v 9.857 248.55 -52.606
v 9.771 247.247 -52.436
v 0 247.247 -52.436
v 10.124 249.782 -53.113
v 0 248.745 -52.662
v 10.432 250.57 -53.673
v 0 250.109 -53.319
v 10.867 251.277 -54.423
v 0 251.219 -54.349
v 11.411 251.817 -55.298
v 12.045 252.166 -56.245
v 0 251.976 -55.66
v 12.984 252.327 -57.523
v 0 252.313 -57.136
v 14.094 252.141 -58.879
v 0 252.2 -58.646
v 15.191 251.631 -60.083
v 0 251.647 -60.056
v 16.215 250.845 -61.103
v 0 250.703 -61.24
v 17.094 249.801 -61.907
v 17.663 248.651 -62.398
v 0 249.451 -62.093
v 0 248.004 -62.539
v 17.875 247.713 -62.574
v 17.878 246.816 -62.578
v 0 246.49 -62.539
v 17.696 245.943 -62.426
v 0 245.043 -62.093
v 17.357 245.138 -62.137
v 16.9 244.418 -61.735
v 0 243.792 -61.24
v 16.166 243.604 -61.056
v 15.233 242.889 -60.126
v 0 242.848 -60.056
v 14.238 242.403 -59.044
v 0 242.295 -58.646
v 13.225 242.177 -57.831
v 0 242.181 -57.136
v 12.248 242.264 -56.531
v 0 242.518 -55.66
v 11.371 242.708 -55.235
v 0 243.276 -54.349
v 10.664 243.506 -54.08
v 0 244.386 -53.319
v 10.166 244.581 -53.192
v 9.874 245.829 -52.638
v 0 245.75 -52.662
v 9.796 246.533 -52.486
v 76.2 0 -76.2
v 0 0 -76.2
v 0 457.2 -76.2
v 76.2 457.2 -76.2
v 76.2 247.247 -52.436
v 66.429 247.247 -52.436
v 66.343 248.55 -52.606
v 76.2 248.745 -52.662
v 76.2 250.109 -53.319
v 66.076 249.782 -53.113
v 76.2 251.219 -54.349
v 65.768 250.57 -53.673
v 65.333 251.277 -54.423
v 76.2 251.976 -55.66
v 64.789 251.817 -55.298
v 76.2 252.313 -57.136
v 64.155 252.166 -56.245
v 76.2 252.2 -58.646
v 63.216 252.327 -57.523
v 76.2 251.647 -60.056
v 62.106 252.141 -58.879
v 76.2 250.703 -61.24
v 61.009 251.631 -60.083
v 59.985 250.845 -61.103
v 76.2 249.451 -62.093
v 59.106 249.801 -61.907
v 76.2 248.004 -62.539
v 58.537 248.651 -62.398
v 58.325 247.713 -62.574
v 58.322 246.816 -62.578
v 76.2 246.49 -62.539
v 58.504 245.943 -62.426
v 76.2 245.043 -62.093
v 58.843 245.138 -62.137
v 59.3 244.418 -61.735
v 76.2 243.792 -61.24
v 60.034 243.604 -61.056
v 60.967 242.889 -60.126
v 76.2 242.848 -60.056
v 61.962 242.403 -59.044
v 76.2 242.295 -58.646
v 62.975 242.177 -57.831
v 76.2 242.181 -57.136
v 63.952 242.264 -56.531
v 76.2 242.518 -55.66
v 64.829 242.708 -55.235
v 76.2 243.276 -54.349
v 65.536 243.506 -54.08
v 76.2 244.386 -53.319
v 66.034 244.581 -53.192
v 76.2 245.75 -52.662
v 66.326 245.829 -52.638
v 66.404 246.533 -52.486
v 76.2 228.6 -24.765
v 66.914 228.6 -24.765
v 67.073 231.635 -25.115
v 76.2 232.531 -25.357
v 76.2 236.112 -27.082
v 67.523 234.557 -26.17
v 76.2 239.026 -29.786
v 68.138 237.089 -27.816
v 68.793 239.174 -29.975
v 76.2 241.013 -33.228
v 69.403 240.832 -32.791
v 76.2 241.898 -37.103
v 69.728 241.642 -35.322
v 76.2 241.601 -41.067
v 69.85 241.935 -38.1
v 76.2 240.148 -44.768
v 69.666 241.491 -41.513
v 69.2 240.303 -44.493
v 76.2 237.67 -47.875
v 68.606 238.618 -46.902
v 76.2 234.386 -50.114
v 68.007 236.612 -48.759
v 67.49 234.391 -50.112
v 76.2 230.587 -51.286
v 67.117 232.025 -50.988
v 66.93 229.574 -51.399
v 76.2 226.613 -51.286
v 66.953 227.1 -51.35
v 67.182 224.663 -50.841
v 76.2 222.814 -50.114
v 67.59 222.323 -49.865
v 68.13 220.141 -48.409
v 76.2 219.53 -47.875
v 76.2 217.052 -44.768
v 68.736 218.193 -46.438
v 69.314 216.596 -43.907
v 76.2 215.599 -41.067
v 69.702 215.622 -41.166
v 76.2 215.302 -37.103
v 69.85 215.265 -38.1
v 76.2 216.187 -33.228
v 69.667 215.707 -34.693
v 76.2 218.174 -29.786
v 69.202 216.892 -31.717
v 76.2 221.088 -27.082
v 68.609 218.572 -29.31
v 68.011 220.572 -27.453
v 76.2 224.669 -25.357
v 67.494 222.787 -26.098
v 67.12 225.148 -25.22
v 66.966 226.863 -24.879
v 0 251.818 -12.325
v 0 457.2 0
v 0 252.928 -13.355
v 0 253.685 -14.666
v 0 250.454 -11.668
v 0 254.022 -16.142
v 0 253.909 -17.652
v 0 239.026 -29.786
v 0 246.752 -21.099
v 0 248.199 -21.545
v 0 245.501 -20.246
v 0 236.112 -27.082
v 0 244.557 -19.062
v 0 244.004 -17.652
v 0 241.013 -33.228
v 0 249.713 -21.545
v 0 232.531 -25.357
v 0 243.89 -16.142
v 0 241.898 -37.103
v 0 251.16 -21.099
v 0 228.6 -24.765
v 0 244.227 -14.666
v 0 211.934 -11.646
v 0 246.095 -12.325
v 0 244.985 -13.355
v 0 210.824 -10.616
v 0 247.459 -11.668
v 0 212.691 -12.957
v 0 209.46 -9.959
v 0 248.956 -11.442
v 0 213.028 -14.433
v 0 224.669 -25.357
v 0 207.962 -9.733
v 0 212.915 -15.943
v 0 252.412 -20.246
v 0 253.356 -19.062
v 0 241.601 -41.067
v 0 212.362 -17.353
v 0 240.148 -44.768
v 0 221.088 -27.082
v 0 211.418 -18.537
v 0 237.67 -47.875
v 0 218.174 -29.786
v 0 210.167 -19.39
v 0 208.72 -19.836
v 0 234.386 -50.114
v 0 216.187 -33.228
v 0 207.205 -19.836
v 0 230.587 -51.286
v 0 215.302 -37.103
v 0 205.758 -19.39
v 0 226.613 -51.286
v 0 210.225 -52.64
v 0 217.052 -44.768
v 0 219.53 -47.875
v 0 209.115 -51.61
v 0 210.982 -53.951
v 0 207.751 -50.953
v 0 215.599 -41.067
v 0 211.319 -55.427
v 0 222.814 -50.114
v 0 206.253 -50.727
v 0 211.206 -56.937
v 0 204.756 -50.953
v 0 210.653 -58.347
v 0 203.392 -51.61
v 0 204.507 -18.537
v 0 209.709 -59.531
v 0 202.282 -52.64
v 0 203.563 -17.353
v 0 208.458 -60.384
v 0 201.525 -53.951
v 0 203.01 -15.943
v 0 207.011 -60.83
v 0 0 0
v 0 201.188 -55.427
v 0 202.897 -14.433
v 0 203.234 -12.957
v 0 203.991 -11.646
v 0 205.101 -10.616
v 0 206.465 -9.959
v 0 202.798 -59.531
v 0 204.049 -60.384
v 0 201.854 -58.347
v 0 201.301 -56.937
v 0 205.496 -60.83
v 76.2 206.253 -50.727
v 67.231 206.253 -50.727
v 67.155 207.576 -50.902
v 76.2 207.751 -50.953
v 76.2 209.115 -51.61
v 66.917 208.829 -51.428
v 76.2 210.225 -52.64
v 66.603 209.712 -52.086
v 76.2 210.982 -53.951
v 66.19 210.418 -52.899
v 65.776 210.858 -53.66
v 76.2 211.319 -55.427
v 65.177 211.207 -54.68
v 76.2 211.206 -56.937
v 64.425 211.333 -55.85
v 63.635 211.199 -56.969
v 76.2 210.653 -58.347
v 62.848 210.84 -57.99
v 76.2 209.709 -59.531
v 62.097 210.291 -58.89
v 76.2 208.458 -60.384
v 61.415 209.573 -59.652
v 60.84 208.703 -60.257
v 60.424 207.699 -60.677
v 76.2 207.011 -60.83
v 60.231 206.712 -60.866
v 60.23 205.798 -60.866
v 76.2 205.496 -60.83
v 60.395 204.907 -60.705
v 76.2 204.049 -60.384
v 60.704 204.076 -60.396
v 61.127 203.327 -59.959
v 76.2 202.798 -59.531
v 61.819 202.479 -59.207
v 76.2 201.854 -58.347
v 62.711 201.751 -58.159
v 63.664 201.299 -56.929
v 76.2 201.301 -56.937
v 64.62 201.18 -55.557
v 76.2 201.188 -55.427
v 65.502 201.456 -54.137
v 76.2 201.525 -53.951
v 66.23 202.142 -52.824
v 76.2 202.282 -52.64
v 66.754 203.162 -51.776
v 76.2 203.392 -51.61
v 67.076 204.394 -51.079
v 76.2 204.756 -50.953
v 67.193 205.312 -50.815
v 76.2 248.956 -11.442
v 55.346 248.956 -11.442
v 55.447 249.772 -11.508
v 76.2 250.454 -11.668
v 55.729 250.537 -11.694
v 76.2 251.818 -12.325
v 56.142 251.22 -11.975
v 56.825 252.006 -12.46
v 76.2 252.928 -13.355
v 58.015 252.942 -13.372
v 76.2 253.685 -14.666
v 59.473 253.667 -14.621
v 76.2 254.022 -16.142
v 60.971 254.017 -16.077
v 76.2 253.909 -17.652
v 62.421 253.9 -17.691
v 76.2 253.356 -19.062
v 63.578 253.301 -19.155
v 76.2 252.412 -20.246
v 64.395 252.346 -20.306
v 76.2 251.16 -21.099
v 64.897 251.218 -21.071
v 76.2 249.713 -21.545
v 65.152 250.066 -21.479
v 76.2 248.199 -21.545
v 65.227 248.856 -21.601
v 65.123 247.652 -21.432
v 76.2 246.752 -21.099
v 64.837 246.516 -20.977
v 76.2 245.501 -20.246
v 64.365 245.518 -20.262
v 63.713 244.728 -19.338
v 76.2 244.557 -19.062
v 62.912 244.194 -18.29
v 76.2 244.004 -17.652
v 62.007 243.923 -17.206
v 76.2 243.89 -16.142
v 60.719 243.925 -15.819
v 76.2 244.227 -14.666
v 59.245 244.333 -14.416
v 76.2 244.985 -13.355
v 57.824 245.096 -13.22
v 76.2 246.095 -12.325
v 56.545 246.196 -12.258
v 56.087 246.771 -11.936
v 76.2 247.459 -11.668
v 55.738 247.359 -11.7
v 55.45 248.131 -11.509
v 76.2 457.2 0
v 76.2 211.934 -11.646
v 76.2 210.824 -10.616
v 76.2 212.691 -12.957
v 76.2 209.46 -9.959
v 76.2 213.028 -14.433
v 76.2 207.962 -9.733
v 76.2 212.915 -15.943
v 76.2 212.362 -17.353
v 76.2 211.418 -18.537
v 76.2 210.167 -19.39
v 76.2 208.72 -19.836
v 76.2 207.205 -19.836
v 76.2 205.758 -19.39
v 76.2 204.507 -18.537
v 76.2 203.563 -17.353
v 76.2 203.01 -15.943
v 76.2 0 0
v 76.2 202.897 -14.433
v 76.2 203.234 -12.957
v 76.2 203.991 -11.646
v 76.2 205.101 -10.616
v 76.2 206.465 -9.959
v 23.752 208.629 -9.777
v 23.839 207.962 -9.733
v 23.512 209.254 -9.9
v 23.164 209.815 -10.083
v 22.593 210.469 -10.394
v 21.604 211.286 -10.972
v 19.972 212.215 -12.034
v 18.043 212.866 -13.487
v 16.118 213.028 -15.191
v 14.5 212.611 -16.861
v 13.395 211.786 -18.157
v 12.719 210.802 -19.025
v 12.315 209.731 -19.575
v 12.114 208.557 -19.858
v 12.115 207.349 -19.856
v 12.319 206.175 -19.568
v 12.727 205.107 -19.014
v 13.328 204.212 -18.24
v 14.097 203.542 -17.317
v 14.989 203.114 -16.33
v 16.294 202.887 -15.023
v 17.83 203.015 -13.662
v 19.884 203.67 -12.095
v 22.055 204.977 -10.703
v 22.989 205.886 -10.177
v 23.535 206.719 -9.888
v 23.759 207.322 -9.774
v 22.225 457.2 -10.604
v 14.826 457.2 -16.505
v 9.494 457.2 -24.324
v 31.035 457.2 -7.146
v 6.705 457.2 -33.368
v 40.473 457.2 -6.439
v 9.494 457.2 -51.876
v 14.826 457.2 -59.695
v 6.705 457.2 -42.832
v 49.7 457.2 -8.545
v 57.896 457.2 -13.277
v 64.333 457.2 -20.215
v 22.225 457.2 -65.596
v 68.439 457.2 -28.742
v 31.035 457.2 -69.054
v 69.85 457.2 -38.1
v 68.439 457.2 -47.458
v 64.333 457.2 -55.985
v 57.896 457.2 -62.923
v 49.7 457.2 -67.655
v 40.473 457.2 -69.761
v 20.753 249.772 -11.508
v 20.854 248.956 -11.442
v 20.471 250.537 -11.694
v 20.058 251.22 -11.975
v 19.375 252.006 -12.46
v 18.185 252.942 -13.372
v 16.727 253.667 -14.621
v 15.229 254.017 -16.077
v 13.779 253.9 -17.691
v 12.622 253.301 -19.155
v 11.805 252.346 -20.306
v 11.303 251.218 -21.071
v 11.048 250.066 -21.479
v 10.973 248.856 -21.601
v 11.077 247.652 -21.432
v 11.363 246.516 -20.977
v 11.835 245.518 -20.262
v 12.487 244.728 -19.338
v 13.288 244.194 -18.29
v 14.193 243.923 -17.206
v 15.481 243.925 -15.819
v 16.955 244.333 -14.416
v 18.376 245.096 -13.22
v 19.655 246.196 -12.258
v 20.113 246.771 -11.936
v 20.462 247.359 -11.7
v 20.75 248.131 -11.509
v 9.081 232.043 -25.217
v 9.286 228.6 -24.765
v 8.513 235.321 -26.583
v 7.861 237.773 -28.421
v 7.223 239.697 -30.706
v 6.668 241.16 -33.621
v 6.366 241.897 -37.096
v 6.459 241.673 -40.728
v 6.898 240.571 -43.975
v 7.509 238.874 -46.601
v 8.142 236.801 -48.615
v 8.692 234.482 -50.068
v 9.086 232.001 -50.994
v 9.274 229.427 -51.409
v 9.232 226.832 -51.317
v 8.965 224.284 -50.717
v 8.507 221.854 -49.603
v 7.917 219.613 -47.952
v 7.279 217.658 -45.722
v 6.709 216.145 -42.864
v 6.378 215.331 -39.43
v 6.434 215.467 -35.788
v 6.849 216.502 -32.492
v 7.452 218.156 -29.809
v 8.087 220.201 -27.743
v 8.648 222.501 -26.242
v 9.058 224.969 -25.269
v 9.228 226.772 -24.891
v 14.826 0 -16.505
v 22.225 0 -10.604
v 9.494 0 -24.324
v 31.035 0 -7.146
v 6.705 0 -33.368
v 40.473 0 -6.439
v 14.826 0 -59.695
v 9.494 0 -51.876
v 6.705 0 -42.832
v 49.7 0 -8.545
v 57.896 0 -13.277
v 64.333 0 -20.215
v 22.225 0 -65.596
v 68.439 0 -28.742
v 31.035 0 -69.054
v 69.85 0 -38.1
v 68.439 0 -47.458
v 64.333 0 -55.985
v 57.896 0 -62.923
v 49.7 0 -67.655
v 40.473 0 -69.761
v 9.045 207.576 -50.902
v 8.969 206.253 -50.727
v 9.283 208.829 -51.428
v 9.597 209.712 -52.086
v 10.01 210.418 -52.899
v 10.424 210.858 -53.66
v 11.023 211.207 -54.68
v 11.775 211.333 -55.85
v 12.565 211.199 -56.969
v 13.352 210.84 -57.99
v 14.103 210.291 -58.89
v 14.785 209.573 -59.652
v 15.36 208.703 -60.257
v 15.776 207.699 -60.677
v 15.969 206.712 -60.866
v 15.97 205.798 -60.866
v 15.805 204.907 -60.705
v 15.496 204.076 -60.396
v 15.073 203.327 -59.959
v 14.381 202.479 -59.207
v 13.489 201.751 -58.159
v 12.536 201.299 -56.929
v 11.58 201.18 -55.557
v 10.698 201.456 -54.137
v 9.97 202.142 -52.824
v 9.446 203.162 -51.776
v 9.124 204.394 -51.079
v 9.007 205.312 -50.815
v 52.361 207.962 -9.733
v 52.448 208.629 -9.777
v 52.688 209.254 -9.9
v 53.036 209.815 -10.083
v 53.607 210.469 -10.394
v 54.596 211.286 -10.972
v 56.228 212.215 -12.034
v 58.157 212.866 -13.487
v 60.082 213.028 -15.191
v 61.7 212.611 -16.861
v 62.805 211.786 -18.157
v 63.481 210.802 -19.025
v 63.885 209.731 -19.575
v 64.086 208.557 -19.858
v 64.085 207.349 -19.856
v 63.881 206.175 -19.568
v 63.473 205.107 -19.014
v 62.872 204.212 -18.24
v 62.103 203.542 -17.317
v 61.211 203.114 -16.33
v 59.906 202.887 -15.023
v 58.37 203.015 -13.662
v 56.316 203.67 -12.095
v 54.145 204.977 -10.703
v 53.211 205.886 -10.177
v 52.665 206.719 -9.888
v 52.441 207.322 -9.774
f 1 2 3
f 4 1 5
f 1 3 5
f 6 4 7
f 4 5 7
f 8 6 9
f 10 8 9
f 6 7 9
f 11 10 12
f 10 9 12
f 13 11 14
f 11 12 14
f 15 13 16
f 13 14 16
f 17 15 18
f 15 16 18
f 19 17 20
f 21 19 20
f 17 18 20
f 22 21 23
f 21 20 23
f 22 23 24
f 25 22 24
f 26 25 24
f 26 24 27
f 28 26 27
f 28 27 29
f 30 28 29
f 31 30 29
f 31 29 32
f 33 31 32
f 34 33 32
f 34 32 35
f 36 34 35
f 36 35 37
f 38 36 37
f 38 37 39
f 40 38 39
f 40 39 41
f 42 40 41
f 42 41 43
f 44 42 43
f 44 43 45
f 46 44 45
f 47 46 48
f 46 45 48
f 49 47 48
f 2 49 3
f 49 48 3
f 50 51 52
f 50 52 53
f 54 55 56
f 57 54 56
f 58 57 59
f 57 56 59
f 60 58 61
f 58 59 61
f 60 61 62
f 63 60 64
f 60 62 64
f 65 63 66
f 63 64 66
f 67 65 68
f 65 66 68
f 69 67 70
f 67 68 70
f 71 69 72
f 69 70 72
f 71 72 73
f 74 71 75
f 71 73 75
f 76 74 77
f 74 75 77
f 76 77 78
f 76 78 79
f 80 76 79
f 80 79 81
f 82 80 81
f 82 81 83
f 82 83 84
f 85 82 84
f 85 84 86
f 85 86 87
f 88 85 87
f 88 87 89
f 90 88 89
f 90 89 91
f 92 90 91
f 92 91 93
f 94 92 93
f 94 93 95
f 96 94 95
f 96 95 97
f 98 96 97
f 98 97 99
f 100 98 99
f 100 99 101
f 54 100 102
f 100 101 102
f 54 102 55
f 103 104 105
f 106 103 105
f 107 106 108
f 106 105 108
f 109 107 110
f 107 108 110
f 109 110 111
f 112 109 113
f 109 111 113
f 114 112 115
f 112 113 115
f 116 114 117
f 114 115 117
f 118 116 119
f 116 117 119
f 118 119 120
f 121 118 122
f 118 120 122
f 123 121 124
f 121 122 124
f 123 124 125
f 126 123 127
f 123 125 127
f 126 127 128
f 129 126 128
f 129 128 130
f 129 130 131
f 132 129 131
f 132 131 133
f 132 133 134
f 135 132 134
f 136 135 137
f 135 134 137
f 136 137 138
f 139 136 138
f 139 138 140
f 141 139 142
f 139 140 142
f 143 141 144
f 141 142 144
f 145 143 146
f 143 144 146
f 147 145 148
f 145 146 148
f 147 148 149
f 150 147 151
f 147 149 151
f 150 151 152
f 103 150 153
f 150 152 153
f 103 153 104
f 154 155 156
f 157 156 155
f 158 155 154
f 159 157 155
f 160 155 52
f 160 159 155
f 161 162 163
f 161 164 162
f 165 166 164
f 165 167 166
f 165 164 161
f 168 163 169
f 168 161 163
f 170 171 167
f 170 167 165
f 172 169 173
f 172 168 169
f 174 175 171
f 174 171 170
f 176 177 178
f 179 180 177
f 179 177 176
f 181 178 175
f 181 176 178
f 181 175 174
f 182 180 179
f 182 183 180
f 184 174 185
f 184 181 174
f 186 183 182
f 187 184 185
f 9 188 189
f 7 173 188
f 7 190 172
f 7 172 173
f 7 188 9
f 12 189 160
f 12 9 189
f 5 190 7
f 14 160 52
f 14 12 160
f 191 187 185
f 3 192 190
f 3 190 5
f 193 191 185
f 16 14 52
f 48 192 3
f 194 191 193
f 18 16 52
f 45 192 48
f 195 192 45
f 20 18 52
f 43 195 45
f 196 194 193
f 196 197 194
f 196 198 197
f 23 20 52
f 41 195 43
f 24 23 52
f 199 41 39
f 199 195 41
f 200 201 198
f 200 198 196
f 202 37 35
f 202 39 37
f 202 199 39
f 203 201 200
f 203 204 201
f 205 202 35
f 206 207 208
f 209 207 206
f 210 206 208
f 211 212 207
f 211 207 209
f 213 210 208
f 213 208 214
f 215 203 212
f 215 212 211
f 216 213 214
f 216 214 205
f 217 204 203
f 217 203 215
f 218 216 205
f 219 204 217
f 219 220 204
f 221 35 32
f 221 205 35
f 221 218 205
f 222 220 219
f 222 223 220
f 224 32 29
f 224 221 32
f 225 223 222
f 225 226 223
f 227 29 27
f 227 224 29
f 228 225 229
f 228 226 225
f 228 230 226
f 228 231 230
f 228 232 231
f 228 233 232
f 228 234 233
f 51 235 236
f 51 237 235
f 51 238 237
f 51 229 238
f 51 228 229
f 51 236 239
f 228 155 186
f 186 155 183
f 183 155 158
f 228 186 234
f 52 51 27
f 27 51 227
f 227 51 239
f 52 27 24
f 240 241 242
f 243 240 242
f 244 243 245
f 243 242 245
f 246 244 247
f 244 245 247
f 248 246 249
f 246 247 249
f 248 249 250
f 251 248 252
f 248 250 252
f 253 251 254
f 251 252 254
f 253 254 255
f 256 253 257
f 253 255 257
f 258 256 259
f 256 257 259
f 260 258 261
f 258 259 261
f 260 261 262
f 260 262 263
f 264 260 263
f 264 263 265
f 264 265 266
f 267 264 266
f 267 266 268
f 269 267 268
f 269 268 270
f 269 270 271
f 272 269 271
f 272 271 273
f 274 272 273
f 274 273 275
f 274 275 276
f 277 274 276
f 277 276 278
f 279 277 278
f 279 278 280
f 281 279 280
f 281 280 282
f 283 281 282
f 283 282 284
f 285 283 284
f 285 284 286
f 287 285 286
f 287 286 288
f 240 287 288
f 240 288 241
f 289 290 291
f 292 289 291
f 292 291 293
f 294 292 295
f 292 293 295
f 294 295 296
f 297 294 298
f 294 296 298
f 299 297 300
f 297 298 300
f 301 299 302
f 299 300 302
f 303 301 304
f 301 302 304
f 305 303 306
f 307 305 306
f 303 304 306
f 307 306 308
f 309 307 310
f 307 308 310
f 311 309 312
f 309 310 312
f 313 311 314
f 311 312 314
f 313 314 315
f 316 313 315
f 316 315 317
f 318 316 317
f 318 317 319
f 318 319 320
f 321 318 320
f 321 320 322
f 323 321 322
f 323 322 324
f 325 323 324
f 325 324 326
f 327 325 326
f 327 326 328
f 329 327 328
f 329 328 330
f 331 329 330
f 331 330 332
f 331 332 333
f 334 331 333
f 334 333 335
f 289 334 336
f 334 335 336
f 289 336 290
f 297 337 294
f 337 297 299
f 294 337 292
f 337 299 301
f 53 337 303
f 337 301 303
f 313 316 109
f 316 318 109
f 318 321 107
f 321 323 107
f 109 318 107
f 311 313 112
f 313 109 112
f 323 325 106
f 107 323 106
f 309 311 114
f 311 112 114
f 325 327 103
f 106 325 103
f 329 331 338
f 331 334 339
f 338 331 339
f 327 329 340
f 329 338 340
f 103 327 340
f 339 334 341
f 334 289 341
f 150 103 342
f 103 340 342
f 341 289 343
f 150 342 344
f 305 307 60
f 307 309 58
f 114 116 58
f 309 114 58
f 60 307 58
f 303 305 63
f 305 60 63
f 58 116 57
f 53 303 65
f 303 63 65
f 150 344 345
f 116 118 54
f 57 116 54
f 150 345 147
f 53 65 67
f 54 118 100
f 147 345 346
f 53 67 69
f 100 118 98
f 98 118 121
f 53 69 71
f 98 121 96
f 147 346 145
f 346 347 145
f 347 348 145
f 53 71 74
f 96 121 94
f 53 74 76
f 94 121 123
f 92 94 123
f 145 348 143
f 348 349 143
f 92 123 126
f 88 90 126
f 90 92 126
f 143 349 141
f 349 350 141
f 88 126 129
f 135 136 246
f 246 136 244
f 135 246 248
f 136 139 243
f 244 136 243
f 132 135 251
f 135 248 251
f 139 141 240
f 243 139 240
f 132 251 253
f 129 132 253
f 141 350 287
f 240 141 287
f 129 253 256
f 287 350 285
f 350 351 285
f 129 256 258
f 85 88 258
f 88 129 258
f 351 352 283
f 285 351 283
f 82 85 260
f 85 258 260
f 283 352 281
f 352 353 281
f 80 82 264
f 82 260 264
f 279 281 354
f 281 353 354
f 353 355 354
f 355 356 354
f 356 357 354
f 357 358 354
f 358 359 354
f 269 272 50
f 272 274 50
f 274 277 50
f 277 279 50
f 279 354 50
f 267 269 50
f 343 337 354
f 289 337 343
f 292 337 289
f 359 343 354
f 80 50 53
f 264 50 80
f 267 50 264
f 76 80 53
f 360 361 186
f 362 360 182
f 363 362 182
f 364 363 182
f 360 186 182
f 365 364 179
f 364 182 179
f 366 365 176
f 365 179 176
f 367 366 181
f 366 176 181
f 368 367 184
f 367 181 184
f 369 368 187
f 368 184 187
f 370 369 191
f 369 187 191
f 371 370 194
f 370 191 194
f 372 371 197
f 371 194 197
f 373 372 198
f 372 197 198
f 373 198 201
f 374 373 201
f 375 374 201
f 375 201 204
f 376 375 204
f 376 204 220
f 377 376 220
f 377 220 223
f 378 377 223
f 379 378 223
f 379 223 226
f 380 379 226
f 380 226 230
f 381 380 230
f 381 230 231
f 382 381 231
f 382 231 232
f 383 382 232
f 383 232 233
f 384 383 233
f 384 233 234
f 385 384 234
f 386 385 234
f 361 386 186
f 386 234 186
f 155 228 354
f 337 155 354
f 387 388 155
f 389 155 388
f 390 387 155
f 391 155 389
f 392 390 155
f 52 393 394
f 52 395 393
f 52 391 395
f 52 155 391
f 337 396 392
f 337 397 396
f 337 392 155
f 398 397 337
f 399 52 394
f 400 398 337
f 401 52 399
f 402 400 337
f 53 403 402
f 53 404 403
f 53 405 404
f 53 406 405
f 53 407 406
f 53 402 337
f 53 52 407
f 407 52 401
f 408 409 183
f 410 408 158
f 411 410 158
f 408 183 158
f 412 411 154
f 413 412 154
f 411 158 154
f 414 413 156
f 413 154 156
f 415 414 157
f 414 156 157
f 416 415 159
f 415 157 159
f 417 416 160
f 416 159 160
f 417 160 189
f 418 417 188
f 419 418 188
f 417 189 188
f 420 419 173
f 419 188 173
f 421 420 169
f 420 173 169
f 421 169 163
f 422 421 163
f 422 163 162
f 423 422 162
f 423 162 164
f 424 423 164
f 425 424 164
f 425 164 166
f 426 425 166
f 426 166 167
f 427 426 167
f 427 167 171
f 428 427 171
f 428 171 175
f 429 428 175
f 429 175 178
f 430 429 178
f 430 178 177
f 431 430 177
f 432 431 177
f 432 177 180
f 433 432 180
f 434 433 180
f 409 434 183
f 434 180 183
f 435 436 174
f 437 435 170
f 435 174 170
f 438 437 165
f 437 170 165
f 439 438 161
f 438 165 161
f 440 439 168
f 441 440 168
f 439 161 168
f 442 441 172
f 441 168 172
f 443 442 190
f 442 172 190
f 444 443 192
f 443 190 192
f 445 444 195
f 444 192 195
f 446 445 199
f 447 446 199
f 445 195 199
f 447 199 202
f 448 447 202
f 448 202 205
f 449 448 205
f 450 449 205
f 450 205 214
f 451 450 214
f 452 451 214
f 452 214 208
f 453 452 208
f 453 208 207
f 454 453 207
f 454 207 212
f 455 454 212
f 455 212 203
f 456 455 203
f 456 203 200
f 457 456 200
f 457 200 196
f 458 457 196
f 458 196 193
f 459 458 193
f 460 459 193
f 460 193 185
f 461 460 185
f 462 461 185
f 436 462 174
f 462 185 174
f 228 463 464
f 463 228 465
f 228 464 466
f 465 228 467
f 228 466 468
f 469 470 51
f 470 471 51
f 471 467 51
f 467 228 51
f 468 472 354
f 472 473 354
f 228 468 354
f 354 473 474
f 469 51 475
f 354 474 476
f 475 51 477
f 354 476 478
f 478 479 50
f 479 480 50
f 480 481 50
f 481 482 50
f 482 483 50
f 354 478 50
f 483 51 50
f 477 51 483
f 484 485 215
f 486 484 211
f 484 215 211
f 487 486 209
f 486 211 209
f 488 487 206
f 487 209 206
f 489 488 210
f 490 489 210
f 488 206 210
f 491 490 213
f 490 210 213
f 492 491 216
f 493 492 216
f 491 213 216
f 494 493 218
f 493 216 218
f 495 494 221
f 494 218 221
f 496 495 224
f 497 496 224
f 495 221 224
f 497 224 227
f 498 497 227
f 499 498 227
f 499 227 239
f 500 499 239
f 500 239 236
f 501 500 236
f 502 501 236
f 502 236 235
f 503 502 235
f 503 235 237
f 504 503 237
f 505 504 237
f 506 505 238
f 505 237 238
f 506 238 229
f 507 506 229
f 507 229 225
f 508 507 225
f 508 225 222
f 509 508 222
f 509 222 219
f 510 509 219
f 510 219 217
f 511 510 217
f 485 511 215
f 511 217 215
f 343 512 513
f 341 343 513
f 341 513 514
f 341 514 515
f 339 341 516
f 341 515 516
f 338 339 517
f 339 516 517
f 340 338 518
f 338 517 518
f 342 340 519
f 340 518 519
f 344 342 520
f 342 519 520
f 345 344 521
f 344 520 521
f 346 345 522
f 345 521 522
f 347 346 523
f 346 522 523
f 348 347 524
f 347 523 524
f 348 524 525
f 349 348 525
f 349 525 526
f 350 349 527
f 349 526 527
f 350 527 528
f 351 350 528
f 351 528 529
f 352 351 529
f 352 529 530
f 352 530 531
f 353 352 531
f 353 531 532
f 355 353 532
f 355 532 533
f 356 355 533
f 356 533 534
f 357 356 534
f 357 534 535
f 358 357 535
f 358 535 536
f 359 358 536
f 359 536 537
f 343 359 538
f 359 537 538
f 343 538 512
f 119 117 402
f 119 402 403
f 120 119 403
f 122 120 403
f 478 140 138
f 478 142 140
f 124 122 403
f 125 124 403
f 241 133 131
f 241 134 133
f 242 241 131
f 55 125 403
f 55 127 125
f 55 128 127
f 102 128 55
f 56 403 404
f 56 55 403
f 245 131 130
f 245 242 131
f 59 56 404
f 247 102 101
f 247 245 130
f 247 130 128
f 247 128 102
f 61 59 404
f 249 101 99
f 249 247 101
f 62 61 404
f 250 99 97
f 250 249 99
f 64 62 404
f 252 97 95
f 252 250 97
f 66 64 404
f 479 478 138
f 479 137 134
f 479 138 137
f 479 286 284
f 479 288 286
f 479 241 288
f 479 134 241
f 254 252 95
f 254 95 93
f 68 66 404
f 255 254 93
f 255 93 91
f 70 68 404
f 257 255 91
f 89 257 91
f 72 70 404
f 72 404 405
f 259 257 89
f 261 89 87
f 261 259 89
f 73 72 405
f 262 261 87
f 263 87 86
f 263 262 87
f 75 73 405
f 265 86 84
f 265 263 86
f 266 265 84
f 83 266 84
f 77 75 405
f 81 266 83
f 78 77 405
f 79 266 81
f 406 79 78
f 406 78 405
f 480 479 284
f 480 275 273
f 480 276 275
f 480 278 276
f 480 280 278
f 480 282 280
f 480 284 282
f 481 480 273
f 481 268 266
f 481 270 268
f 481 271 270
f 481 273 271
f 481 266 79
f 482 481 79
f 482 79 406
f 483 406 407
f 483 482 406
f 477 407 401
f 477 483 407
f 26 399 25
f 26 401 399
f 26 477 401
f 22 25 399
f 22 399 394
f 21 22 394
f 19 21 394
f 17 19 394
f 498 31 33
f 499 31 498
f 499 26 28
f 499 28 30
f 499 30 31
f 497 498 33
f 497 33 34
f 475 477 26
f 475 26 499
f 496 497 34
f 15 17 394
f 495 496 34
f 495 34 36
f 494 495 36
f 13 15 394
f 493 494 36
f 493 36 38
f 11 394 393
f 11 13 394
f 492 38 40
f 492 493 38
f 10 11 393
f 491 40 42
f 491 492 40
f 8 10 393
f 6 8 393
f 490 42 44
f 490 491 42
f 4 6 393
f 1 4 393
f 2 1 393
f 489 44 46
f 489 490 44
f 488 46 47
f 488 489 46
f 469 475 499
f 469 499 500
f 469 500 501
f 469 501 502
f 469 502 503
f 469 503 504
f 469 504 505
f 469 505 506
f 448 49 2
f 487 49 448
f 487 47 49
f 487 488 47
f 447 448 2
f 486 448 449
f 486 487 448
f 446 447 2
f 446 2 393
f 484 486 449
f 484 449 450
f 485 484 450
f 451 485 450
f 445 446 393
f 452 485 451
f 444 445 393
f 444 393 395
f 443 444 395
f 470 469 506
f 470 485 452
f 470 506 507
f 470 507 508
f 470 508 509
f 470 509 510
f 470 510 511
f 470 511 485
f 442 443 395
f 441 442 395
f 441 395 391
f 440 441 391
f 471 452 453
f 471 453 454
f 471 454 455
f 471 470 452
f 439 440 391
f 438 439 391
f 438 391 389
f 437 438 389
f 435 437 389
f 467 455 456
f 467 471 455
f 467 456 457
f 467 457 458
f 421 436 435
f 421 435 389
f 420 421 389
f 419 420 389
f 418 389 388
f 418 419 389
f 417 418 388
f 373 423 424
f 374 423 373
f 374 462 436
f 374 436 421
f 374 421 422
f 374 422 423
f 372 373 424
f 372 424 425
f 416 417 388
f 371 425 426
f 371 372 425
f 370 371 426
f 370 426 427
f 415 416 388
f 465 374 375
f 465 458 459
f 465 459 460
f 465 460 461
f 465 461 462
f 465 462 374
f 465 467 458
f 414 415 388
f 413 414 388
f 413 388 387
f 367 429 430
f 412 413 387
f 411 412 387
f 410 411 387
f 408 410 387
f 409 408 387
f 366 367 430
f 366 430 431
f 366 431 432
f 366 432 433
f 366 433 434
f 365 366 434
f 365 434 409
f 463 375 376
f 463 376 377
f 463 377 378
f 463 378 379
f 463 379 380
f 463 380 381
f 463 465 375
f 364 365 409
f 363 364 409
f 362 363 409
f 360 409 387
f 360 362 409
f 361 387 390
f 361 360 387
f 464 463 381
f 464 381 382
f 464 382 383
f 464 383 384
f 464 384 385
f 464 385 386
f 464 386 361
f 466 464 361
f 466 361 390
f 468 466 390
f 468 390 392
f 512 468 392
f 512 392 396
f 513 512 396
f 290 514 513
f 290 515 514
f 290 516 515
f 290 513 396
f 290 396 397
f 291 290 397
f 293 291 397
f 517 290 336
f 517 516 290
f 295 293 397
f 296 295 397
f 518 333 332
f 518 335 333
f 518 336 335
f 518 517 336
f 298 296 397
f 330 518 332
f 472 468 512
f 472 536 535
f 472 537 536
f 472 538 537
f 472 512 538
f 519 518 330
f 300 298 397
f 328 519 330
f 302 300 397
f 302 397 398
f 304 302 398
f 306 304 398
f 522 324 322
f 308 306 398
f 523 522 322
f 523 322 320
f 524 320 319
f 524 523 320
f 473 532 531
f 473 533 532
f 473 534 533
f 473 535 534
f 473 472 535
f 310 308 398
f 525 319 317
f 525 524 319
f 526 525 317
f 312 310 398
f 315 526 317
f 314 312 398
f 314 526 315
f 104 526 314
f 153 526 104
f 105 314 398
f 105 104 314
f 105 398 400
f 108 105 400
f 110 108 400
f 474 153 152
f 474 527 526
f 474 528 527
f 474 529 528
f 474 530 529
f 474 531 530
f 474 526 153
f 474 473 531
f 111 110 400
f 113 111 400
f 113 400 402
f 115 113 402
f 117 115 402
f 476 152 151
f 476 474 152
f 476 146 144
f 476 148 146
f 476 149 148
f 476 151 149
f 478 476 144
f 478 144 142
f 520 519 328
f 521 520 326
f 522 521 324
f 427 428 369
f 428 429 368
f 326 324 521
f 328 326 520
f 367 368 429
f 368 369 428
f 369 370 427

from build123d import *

# Parameters (mm, degrees)
SKETCH1_W           = 76.2
SKETCH1_H           = 76.2
SKETCH1_R           = 31.75
BOSS_EXTRUDE1_DEPTH = 457.2
SKETCH2_R           = 13.335
CUT_EXTRUDE1_DEPTH  = 914.4
SKETCH3_R           = 5.08
CUT_EXTRUDE2_DEPTH  = 914.4


with BuildPart() as part:
    # Sketch1 → Boss-Extrude1 (new body)
    with BuildSketch(Plane(origin=(0, 0, 0), x_dir=(1, 0, 0), z_dir=(0, 1, 0))):
        with Locations((38.1, 38.1)):
            Rectangle(SKETCH1_W, SKETCH1_H)
        with Locations((38.1, 38.1)):
            Circle(SKETCH1_R, mode=Mode.SUBTRACT)
    extrude(amount=BOSS_EXTRUDE1_DEPTH)

    # Sketch2 → Cut-Extrude1 (cut)
    with BuildSketch(Plane.ZY):
        with Locations((-38.1, 228.6)):
            Circle(SKETCH2_R)
    extrude(amount=-CUT_EXTRUDE1_DEPTH, mode=Mode.SUBTRACT)

    # Sketch3 → Cut-Extrude2 (cut)
    with BuildSketch(Plane.ZY):
        with Locations((-57.515901481, 247.247263344)):
            Circle(SKETCH3_R)
        with Locations((-16.522072817, 248.95626833)):
            Circle(SKETCH3_R)
        with Locations((-14.81306783, 207.962439666)):
            Circle(SKETCH3_R)
        with Locations((-55.806896495, 206.253434679)):
            Circle(SKETCH3_R)
    extrude(amount=-CUT_EXTRUDE2_DEPTH, mode=Mode.SUBTRACT)


solid = part.part
